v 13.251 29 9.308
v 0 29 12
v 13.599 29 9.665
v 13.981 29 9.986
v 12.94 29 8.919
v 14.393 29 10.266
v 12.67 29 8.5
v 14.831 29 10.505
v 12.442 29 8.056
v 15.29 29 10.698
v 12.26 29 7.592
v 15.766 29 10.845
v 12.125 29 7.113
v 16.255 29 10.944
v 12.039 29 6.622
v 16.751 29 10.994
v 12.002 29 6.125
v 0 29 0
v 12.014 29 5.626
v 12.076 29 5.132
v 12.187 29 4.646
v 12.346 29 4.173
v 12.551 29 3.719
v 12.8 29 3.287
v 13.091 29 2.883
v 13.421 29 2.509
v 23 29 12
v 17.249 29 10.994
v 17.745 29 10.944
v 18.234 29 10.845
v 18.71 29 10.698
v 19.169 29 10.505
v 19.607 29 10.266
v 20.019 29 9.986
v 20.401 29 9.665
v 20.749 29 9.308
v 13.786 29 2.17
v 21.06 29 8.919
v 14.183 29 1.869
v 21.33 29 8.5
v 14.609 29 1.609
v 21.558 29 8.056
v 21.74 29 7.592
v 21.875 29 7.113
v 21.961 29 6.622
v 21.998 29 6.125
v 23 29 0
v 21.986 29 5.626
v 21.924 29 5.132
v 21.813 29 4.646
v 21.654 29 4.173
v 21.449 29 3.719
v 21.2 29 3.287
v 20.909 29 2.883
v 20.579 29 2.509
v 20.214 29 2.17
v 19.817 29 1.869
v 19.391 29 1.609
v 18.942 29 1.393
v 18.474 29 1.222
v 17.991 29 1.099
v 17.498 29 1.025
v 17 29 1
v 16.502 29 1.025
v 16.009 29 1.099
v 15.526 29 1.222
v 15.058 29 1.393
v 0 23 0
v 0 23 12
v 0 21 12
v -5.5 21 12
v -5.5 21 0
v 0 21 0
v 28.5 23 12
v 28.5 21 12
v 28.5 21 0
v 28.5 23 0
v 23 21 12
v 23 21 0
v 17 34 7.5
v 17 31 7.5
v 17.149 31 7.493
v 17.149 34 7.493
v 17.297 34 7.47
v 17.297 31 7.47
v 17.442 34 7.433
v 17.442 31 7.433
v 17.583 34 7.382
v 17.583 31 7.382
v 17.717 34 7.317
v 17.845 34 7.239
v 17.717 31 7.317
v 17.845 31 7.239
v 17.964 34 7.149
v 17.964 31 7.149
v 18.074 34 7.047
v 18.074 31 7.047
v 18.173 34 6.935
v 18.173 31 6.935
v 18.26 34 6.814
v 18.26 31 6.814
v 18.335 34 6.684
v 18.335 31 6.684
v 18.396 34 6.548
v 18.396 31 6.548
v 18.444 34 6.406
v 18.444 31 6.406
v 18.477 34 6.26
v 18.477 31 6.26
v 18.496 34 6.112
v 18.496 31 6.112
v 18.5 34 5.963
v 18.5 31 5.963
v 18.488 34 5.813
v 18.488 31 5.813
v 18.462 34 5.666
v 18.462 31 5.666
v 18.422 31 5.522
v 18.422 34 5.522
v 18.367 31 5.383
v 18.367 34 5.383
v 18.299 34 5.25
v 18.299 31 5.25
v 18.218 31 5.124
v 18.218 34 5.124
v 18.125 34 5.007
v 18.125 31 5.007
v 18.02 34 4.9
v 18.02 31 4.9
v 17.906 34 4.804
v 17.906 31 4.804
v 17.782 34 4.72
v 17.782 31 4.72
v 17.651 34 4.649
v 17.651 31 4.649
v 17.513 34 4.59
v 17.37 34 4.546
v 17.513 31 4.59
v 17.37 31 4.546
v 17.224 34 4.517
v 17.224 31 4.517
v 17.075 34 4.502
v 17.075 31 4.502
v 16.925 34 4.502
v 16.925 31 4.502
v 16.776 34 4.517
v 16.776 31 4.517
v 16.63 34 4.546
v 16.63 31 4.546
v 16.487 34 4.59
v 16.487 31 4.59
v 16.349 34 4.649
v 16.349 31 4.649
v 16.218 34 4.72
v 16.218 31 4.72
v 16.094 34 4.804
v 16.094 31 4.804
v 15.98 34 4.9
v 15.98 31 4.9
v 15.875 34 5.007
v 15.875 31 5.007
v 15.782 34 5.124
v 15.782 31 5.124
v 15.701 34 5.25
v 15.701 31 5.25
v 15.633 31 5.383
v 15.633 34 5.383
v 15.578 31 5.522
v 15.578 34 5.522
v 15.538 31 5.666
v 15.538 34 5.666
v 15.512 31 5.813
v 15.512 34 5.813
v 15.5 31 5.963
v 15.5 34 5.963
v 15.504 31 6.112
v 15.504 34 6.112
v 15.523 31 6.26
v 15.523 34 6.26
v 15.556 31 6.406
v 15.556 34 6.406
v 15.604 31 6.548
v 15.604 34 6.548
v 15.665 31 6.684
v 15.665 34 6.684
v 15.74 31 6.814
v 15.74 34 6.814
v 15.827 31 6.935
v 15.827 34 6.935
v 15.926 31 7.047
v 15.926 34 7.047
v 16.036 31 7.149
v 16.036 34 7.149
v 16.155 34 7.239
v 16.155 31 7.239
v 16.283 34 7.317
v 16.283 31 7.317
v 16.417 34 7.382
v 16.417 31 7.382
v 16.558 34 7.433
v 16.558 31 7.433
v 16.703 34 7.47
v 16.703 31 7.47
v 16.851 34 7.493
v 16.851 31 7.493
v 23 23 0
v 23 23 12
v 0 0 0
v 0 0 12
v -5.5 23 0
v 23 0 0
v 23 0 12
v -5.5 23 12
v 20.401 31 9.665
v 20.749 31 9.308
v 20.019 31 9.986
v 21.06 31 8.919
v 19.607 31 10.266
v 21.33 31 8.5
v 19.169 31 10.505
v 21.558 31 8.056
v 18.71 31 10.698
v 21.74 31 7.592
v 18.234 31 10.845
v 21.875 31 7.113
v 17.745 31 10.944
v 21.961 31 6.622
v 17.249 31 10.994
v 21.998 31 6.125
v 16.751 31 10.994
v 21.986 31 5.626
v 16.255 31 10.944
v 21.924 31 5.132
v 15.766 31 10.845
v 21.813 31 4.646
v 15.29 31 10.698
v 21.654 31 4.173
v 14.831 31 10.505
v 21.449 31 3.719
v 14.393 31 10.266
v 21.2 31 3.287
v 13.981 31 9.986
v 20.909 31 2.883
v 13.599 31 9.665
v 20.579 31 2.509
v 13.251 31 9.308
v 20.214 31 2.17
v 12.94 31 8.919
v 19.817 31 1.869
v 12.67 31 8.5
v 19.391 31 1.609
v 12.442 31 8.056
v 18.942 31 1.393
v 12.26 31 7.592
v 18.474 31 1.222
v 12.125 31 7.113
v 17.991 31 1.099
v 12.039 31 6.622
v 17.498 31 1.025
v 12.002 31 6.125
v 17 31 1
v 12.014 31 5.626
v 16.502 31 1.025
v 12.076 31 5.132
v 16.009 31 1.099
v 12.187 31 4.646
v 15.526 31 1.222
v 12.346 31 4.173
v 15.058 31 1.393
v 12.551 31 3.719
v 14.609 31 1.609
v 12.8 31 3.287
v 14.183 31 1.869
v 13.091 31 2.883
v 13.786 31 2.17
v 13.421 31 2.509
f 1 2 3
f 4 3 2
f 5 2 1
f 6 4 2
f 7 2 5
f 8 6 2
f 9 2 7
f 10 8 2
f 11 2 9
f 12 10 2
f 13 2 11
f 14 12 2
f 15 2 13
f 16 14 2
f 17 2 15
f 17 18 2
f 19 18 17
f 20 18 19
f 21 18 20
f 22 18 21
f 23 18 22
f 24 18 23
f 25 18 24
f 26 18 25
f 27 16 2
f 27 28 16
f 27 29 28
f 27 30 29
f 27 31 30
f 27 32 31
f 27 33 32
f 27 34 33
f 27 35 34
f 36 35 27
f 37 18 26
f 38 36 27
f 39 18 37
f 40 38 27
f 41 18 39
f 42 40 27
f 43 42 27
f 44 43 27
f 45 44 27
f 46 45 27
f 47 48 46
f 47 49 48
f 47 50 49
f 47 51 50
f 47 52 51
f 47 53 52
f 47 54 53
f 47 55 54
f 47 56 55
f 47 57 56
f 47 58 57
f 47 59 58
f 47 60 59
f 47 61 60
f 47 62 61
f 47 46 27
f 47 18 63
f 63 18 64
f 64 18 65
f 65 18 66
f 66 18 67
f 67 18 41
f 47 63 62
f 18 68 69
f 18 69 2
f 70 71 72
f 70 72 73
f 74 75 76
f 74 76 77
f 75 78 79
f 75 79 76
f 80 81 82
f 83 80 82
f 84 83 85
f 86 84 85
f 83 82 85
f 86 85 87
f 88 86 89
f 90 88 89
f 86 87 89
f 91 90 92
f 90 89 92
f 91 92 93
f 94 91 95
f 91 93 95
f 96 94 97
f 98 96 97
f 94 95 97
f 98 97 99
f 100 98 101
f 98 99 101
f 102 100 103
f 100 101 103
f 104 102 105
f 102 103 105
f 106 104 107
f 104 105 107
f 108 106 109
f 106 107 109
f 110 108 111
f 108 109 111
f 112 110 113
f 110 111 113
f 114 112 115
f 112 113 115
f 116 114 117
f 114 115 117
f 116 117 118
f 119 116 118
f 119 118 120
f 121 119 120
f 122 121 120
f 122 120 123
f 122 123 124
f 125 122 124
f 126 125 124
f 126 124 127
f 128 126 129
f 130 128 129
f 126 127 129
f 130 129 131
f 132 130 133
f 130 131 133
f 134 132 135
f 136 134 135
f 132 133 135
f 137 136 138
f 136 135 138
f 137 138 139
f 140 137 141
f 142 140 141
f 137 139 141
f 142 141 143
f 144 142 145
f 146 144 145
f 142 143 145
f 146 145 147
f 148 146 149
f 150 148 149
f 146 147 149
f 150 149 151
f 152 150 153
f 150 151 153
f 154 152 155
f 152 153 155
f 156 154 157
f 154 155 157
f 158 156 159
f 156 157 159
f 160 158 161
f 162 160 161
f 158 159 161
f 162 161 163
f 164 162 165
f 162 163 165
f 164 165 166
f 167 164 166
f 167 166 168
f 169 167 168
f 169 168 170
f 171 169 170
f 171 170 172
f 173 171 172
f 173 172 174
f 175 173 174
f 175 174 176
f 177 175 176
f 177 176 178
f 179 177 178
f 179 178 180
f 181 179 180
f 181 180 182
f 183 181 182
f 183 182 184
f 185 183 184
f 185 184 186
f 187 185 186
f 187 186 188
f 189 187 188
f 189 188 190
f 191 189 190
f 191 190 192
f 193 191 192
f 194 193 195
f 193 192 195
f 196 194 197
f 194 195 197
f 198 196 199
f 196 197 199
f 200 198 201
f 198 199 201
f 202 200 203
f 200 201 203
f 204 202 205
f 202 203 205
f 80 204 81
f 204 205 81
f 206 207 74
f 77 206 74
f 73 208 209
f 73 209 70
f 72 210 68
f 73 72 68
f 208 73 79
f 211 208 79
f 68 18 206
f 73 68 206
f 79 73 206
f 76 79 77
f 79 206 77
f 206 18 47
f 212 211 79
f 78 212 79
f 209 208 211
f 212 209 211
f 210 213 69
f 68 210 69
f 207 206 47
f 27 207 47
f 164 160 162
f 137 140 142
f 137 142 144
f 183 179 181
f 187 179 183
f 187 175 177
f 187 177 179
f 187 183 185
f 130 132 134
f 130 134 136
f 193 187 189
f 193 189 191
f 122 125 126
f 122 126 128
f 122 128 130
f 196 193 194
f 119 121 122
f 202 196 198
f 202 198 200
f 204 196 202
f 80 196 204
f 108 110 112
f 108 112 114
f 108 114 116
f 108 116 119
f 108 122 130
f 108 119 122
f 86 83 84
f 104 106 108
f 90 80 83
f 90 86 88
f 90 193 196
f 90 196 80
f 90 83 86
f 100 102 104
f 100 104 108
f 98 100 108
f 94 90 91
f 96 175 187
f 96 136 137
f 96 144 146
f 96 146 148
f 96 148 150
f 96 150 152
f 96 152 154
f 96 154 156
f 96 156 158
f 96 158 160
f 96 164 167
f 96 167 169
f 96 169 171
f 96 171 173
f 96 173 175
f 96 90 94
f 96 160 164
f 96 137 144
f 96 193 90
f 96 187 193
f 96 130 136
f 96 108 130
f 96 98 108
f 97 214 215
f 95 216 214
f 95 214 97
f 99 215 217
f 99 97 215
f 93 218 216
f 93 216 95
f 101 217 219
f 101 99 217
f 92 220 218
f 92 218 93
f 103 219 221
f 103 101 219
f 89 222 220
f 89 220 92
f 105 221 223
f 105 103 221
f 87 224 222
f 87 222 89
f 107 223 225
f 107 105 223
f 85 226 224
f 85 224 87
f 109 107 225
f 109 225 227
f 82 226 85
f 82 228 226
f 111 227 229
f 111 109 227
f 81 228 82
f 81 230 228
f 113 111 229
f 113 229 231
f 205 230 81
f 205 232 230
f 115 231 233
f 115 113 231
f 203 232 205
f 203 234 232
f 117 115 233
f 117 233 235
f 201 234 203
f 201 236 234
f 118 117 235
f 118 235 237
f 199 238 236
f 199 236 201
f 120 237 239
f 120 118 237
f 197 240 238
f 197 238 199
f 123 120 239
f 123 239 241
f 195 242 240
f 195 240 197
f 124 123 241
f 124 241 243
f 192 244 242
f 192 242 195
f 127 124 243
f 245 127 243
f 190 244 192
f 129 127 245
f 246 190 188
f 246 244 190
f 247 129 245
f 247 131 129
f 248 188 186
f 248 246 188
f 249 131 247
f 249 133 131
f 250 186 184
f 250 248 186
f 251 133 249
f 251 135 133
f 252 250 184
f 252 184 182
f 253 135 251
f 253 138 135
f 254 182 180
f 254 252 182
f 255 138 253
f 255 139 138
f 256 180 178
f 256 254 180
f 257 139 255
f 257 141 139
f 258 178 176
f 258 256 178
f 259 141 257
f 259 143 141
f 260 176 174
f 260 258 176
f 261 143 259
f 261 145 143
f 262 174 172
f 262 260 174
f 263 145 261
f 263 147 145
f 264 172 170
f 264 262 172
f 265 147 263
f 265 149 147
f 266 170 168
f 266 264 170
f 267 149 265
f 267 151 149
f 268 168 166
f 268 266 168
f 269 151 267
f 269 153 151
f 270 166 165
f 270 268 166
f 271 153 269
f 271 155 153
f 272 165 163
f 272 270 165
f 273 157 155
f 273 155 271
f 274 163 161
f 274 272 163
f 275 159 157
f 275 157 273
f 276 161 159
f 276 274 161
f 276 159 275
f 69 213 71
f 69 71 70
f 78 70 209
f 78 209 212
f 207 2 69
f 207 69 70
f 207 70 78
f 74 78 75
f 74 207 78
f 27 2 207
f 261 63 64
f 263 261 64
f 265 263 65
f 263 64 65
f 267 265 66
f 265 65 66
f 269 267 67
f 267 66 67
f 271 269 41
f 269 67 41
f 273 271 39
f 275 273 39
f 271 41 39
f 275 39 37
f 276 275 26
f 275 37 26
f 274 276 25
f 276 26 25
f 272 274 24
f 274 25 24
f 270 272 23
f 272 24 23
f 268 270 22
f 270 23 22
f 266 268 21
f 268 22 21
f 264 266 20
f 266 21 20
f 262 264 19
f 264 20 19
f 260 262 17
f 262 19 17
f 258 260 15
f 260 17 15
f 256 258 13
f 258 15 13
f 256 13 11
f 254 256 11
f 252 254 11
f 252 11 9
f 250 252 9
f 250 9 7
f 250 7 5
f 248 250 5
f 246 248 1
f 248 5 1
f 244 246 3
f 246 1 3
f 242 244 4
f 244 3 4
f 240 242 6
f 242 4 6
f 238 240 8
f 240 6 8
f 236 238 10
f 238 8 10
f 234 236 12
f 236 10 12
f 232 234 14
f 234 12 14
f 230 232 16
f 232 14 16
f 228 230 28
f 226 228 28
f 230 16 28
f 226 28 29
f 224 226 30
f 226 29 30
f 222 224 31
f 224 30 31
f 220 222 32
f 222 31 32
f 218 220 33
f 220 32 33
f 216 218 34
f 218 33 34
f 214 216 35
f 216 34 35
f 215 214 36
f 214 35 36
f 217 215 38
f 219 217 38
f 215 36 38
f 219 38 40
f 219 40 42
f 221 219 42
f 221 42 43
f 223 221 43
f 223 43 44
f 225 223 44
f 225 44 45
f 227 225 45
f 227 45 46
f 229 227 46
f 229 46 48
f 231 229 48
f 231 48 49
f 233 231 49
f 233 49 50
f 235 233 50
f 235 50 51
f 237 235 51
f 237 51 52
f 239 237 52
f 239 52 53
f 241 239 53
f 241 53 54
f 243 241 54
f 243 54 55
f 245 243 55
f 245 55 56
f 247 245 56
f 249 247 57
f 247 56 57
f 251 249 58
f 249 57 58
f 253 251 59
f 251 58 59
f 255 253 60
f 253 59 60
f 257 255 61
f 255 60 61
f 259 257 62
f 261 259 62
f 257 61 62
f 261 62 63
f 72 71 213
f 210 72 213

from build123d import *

# Parameters (mm, degrees)
SKETCH1_W           = 23
SKETCH1_H           = 29
BOSS_EXTRUDE1_DEPTH = 12
SKETCH3_W           = 34
SKETCH3_H           = 2
BOSS_EXTRUDE2_DEPTH = 12
SKETCH4_R           = 5
BOSS_EXTRUDE3_DEPTH = 2
SKETCH6_R           = 1.5
BOSS_EXTRUDE4_DEPTH = 3


with BuildPart() as part:
    # Sketch1 → Boss-Extrude1 (new body)
    with BuildSketch(Plane.XY):
        with Locations((11.5, 14.5)):
            Rectangle(SKETCH1_W, SKETCH1_H)
    extrude(amount=BOSS_EXTRUDE1_DEPTH)

    # Sketch3 → Boss-Extrude2 (add)
    with BuildSketch(Plane.XY.offset(12)):
        with Locations((11.5, 22)):
            Rectangle(SKETCH3_W, SKETCH3_H)
    extrude(amount=-BOSS_EXTRUDE2_DEPTH)

    # Sketch4 → Boss-Extrude3 (add)
    with BuildSketch(Plane(origin=(0, 29, 0), x_dir=(1, 0, 0), z_dir=(0, 1, 0))):
        with Locations(Location((17, -6, 0), (0, 0, 90))):
            Circle(SKETCH4_R)
    extrude(amount=BOSS_EXTRUDE3_DEPTH)

    # Sketch6 → Boss-Extrude4 (add)
    with BuildSketch(Plane(origin=(0, 31, 0), x_dir=(1, 0, 0), z_dir=(0, 1, 0))):
        with Locations(Location((17, -6, 0), (0, 0, 270))):
            Circle(SKETCH6_R)
    extrude(amount=BOSS_EXTRUDE4_DEPTH)


solid = part.part
